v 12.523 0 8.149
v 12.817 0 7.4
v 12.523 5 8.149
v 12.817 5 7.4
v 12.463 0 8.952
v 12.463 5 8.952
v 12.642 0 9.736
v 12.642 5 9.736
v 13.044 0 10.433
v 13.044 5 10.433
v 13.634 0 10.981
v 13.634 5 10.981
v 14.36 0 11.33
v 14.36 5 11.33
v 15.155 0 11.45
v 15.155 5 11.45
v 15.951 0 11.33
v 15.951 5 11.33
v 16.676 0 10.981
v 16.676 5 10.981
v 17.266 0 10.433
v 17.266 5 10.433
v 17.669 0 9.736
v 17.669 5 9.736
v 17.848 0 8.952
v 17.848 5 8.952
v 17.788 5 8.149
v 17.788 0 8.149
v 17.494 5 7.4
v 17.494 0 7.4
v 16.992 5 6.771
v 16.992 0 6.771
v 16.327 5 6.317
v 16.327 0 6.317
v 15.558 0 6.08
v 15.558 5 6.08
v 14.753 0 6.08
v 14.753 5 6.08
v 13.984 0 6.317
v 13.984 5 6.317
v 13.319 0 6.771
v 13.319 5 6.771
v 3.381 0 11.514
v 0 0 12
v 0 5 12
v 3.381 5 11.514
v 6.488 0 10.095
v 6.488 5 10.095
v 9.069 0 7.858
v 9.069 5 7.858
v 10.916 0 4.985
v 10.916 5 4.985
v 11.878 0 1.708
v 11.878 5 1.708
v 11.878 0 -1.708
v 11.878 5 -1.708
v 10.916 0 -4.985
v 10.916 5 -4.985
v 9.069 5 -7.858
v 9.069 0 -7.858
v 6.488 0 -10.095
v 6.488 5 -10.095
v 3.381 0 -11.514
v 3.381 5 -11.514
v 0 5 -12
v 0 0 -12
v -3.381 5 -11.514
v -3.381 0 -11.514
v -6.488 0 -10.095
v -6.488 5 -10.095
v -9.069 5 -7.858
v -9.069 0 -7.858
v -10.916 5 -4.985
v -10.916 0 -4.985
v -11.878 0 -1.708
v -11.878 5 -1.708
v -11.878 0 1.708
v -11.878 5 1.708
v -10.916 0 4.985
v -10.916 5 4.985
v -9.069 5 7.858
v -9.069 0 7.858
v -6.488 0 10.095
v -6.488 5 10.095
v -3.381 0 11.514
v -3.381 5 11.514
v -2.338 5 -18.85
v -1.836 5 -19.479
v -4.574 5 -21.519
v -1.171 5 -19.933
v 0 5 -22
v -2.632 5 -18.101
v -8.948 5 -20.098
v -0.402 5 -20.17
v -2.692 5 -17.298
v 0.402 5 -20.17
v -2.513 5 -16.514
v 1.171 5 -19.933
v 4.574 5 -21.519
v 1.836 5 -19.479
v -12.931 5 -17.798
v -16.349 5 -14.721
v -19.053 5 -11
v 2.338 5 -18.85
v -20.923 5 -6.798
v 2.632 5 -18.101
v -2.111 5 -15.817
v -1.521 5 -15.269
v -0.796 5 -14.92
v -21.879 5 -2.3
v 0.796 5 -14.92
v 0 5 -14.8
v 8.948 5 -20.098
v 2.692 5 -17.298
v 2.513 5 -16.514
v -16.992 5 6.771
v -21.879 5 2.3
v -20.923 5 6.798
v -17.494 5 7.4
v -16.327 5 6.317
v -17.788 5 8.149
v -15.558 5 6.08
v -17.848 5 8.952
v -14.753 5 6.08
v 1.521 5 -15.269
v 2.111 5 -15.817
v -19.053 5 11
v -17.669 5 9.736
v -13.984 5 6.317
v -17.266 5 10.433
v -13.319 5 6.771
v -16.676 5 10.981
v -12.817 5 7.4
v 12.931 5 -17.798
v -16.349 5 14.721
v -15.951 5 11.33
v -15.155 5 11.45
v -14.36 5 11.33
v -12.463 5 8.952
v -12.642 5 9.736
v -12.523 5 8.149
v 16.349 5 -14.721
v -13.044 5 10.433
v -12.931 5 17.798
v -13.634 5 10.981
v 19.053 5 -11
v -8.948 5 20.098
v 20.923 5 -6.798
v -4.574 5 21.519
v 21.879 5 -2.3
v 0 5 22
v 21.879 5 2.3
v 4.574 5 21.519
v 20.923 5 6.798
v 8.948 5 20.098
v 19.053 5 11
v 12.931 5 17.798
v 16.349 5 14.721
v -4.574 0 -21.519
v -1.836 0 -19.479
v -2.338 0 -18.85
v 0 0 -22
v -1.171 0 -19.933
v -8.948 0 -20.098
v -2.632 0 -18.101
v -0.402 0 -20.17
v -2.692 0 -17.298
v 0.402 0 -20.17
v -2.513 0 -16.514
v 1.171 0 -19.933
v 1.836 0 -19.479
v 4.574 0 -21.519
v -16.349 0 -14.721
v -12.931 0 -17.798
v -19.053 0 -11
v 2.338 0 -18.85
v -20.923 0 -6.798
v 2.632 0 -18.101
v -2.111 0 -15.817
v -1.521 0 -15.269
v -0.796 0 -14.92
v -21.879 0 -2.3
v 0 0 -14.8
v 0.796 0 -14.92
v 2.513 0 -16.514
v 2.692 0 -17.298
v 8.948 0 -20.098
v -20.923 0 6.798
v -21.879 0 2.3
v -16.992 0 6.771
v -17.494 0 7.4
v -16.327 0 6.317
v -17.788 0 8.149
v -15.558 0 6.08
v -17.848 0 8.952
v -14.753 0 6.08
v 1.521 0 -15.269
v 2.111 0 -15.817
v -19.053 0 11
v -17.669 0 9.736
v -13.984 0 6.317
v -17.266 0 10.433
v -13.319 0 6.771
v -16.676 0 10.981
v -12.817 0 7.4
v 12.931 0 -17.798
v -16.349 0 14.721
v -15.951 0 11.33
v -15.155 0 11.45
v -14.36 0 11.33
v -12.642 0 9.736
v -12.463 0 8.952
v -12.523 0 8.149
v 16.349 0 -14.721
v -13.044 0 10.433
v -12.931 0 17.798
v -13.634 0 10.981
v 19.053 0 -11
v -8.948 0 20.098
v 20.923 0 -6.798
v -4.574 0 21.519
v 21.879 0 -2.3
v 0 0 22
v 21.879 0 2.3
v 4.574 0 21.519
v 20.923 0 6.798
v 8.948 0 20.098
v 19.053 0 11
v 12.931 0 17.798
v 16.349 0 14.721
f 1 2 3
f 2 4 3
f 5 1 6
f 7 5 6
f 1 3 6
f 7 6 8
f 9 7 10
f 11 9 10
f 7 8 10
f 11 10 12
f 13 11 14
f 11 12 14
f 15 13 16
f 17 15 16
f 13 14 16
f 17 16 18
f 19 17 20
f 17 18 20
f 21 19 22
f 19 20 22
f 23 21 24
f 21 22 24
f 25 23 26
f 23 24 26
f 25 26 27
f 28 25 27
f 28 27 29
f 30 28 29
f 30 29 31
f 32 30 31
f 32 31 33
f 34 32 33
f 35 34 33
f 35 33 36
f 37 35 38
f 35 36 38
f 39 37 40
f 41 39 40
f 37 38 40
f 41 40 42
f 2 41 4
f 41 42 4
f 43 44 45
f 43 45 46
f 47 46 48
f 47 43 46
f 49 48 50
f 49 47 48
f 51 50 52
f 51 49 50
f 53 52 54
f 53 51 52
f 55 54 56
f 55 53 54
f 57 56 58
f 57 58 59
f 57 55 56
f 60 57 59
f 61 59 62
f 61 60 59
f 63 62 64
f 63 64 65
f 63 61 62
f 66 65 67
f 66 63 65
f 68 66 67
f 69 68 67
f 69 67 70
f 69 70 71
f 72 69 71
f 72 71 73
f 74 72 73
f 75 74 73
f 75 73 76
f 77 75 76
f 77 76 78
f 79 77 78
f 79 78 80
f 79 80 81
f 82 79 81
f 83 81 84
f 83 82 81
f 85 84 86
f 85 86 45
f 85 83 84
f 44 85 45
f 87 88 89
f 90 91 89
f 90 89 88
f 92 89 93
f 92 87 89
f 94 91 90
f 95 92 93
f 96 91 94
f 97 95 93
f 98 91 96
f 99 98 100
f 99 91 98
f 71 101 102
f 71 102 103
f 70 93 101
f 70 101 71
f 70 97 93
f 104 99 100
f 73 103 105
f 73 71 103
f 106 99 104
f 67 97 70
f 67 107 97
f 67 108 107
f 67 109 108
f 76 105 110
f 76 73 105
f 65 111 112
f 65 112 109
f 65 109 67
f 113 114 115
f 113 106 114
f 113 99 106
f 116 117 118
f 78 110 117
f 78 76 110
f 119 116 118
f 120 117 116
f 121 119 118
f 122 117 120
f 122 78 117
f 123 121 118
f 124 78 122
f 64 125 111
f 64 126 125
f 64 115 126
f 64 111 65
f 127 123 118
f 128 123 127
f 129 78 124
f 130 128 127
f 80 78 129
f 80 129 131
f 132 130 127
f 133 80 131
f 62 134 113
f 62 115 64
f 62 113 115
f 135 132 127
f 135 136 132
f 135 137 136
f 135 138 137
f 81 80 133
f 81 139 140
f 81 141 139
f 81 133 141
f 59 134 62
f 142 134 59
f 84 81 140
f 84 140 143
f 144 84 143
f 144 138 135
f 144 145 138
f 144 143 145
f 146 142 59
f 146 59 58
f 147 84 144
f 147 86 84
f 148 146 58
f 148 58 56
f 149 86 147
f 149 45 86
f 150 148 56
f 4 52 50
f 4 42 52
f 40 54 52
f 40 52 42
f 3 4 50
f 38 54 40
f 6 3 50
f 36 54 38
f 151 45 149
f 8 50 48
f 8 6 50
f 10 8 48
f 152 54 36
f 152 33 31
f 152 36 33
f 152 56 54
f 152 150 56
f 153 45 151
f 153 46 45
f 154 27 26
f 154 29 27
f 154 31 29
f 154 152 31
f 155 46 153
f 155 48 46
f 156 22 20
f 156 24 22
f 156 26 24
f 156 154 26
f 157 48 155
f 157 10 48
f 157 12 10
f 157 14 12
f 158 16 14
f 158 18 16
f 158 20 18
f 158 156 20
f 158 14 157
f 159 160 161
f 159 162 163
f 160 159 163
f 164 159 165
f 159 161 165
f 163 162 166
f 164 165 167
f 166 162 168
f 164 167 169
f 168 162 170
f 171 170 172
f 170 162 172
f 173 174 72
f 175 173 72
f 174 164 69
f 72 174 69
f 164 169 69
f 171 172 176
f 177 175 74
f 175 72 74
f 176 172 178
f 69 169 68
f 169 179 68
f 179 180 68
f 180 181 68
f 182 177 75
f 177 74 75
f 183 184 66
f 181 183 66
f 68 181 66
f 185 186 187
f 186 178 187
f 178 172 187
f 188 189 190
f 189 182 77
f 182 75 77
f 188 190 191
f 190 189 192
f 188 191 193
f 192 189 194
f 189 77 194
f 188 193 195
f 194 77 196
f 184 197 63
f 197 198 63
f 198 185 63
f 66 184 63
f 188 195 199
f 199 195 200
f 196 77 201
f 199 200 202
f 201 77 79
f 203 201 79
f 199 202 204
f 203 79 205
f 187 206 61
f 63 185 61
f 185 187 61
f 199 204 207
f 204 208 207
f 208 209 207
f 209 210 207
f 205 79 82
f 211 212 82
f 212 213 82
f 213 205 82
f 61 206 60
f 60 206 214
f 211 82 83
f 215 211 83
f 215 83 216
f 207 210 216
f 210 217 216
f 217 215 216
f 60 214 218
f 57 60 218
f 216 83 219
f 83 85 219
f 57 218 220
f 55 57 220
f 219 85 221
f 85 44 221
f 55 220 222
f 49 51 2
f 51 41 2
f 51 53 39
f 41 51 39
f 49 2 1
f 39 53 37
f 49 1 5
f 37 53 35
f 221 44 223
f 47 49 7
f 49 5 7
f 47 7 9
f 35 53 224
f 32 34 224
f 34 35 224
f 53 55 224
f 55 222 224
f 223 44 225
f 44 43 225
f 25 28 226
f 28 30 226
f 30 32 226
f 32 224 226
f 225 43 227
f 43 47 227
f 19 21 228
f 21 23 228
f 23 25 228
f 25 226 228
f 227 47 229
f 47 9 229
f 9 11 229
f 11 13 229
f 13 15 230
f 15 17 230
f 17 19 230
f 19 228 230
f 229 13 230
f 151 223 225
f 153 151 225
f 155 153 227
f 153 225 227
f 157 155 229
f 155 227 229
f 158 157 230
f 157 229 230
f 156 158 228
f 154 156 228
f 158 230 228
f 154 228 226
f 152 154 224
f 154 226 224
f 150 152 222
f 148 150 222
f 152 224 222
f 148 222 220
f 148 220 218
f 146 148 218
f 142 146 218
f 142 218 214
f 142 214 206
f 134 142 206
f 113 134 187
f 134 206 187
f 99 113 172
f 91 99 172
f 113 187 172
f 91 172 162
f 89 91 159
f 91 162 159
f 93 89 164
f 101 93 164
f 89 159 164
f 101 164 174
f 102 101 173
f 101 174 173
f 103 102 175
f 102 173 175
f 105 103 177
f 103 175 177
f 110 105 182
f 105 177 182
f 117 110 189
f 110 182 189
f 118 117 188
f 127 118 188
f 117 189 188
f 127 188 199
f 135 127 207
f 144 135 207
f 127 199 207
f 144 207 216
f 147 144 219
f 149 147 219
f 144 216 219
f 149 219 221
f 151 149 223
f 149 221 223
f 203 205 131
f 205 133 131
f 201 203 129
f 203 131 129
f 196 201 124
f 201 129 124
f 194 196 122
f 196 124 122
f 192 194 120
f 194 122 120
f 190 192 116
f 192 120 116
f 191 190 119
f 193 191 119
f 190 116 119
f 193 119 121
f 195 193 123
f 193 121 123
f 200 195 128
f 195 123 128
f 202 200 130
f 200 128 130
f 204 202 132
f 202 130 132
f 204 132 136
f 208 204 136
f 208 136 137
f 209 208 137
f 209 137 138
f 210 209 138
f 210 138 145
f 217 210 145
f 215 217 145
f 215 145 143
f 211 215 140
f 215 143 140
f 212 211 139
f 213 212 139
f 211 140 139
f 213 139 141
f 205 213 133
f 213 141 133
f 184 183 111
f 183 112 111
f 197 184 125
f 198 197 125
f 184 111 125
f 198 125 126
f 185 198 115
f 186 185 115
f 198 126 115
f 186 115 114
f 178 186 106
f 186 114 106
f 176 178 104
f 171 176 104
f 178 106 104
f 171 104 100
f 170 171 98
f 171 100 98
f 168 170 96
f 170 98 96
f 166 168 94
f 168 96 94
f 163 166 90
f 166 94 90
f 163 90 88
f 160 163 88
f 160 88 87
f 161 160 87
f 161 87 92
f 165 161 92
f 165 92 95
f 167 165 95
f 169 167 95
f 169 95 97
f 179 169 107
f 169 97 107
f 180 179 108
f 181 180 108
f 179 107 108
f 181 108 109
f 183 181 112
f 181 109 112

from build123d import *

# Parameters (mm, degrees)
SKETCH_1_R               = 22
SKETCH_1_R_2             = 12
EXTRUDE_1_DEPTH          = 5
SKETCH_1_3_R             = 2.7
CUT_EXTRUDE_1_DEPTH      = 32.511902513
PATTERN_CIRCULAR_1_COUNT = 3


with BuildPart() as part:
    # 草图1 → 凸台-拉伸1 (new body)
    with BuildSketch(Plane(origin=(0, 0, 0), x_dir=(1, 0, 0), z_dir=(0, 1, 0))):
        Circle(SKETCH_1_R)
        Circle(SKETCH_1_R_2, mode=Mode.SUBTRACT)
    extrude(amount=EXTRUDE_1_DEPTH)

    # 草图1<3> → 切除-拉伸1 (cut, symmetric)
    with BuildSketch(Plane(origin=(0, 0, 0), x_dir=(1, 0, 0), z_dir=(0, 1, 0))):
        with Locations((0, 17.5)):
            Circle(SKETCH_1_3_R)
    cut_extrude_1 = extrude(amount=CUT_EXTRUDE_1_DEPTH, both=True, mode=Mode.SUBTRACT)

    # 阵列(圆周)1: 切除-拉伸1 ×3 about axis
    pattern_circular_1_axis = Axis((0, 5, 0), (0, -1, 0))
    for i in range(1, PATTERN_CIRCULAR_1_COUNT):
        add(cut_extrude_1.rotate(pattern_circular_1_axis, i * 360 / PATTERN_CIRCULAR_1_COUNT), mode=Mode.SUBTRACT)


solid = part.part
